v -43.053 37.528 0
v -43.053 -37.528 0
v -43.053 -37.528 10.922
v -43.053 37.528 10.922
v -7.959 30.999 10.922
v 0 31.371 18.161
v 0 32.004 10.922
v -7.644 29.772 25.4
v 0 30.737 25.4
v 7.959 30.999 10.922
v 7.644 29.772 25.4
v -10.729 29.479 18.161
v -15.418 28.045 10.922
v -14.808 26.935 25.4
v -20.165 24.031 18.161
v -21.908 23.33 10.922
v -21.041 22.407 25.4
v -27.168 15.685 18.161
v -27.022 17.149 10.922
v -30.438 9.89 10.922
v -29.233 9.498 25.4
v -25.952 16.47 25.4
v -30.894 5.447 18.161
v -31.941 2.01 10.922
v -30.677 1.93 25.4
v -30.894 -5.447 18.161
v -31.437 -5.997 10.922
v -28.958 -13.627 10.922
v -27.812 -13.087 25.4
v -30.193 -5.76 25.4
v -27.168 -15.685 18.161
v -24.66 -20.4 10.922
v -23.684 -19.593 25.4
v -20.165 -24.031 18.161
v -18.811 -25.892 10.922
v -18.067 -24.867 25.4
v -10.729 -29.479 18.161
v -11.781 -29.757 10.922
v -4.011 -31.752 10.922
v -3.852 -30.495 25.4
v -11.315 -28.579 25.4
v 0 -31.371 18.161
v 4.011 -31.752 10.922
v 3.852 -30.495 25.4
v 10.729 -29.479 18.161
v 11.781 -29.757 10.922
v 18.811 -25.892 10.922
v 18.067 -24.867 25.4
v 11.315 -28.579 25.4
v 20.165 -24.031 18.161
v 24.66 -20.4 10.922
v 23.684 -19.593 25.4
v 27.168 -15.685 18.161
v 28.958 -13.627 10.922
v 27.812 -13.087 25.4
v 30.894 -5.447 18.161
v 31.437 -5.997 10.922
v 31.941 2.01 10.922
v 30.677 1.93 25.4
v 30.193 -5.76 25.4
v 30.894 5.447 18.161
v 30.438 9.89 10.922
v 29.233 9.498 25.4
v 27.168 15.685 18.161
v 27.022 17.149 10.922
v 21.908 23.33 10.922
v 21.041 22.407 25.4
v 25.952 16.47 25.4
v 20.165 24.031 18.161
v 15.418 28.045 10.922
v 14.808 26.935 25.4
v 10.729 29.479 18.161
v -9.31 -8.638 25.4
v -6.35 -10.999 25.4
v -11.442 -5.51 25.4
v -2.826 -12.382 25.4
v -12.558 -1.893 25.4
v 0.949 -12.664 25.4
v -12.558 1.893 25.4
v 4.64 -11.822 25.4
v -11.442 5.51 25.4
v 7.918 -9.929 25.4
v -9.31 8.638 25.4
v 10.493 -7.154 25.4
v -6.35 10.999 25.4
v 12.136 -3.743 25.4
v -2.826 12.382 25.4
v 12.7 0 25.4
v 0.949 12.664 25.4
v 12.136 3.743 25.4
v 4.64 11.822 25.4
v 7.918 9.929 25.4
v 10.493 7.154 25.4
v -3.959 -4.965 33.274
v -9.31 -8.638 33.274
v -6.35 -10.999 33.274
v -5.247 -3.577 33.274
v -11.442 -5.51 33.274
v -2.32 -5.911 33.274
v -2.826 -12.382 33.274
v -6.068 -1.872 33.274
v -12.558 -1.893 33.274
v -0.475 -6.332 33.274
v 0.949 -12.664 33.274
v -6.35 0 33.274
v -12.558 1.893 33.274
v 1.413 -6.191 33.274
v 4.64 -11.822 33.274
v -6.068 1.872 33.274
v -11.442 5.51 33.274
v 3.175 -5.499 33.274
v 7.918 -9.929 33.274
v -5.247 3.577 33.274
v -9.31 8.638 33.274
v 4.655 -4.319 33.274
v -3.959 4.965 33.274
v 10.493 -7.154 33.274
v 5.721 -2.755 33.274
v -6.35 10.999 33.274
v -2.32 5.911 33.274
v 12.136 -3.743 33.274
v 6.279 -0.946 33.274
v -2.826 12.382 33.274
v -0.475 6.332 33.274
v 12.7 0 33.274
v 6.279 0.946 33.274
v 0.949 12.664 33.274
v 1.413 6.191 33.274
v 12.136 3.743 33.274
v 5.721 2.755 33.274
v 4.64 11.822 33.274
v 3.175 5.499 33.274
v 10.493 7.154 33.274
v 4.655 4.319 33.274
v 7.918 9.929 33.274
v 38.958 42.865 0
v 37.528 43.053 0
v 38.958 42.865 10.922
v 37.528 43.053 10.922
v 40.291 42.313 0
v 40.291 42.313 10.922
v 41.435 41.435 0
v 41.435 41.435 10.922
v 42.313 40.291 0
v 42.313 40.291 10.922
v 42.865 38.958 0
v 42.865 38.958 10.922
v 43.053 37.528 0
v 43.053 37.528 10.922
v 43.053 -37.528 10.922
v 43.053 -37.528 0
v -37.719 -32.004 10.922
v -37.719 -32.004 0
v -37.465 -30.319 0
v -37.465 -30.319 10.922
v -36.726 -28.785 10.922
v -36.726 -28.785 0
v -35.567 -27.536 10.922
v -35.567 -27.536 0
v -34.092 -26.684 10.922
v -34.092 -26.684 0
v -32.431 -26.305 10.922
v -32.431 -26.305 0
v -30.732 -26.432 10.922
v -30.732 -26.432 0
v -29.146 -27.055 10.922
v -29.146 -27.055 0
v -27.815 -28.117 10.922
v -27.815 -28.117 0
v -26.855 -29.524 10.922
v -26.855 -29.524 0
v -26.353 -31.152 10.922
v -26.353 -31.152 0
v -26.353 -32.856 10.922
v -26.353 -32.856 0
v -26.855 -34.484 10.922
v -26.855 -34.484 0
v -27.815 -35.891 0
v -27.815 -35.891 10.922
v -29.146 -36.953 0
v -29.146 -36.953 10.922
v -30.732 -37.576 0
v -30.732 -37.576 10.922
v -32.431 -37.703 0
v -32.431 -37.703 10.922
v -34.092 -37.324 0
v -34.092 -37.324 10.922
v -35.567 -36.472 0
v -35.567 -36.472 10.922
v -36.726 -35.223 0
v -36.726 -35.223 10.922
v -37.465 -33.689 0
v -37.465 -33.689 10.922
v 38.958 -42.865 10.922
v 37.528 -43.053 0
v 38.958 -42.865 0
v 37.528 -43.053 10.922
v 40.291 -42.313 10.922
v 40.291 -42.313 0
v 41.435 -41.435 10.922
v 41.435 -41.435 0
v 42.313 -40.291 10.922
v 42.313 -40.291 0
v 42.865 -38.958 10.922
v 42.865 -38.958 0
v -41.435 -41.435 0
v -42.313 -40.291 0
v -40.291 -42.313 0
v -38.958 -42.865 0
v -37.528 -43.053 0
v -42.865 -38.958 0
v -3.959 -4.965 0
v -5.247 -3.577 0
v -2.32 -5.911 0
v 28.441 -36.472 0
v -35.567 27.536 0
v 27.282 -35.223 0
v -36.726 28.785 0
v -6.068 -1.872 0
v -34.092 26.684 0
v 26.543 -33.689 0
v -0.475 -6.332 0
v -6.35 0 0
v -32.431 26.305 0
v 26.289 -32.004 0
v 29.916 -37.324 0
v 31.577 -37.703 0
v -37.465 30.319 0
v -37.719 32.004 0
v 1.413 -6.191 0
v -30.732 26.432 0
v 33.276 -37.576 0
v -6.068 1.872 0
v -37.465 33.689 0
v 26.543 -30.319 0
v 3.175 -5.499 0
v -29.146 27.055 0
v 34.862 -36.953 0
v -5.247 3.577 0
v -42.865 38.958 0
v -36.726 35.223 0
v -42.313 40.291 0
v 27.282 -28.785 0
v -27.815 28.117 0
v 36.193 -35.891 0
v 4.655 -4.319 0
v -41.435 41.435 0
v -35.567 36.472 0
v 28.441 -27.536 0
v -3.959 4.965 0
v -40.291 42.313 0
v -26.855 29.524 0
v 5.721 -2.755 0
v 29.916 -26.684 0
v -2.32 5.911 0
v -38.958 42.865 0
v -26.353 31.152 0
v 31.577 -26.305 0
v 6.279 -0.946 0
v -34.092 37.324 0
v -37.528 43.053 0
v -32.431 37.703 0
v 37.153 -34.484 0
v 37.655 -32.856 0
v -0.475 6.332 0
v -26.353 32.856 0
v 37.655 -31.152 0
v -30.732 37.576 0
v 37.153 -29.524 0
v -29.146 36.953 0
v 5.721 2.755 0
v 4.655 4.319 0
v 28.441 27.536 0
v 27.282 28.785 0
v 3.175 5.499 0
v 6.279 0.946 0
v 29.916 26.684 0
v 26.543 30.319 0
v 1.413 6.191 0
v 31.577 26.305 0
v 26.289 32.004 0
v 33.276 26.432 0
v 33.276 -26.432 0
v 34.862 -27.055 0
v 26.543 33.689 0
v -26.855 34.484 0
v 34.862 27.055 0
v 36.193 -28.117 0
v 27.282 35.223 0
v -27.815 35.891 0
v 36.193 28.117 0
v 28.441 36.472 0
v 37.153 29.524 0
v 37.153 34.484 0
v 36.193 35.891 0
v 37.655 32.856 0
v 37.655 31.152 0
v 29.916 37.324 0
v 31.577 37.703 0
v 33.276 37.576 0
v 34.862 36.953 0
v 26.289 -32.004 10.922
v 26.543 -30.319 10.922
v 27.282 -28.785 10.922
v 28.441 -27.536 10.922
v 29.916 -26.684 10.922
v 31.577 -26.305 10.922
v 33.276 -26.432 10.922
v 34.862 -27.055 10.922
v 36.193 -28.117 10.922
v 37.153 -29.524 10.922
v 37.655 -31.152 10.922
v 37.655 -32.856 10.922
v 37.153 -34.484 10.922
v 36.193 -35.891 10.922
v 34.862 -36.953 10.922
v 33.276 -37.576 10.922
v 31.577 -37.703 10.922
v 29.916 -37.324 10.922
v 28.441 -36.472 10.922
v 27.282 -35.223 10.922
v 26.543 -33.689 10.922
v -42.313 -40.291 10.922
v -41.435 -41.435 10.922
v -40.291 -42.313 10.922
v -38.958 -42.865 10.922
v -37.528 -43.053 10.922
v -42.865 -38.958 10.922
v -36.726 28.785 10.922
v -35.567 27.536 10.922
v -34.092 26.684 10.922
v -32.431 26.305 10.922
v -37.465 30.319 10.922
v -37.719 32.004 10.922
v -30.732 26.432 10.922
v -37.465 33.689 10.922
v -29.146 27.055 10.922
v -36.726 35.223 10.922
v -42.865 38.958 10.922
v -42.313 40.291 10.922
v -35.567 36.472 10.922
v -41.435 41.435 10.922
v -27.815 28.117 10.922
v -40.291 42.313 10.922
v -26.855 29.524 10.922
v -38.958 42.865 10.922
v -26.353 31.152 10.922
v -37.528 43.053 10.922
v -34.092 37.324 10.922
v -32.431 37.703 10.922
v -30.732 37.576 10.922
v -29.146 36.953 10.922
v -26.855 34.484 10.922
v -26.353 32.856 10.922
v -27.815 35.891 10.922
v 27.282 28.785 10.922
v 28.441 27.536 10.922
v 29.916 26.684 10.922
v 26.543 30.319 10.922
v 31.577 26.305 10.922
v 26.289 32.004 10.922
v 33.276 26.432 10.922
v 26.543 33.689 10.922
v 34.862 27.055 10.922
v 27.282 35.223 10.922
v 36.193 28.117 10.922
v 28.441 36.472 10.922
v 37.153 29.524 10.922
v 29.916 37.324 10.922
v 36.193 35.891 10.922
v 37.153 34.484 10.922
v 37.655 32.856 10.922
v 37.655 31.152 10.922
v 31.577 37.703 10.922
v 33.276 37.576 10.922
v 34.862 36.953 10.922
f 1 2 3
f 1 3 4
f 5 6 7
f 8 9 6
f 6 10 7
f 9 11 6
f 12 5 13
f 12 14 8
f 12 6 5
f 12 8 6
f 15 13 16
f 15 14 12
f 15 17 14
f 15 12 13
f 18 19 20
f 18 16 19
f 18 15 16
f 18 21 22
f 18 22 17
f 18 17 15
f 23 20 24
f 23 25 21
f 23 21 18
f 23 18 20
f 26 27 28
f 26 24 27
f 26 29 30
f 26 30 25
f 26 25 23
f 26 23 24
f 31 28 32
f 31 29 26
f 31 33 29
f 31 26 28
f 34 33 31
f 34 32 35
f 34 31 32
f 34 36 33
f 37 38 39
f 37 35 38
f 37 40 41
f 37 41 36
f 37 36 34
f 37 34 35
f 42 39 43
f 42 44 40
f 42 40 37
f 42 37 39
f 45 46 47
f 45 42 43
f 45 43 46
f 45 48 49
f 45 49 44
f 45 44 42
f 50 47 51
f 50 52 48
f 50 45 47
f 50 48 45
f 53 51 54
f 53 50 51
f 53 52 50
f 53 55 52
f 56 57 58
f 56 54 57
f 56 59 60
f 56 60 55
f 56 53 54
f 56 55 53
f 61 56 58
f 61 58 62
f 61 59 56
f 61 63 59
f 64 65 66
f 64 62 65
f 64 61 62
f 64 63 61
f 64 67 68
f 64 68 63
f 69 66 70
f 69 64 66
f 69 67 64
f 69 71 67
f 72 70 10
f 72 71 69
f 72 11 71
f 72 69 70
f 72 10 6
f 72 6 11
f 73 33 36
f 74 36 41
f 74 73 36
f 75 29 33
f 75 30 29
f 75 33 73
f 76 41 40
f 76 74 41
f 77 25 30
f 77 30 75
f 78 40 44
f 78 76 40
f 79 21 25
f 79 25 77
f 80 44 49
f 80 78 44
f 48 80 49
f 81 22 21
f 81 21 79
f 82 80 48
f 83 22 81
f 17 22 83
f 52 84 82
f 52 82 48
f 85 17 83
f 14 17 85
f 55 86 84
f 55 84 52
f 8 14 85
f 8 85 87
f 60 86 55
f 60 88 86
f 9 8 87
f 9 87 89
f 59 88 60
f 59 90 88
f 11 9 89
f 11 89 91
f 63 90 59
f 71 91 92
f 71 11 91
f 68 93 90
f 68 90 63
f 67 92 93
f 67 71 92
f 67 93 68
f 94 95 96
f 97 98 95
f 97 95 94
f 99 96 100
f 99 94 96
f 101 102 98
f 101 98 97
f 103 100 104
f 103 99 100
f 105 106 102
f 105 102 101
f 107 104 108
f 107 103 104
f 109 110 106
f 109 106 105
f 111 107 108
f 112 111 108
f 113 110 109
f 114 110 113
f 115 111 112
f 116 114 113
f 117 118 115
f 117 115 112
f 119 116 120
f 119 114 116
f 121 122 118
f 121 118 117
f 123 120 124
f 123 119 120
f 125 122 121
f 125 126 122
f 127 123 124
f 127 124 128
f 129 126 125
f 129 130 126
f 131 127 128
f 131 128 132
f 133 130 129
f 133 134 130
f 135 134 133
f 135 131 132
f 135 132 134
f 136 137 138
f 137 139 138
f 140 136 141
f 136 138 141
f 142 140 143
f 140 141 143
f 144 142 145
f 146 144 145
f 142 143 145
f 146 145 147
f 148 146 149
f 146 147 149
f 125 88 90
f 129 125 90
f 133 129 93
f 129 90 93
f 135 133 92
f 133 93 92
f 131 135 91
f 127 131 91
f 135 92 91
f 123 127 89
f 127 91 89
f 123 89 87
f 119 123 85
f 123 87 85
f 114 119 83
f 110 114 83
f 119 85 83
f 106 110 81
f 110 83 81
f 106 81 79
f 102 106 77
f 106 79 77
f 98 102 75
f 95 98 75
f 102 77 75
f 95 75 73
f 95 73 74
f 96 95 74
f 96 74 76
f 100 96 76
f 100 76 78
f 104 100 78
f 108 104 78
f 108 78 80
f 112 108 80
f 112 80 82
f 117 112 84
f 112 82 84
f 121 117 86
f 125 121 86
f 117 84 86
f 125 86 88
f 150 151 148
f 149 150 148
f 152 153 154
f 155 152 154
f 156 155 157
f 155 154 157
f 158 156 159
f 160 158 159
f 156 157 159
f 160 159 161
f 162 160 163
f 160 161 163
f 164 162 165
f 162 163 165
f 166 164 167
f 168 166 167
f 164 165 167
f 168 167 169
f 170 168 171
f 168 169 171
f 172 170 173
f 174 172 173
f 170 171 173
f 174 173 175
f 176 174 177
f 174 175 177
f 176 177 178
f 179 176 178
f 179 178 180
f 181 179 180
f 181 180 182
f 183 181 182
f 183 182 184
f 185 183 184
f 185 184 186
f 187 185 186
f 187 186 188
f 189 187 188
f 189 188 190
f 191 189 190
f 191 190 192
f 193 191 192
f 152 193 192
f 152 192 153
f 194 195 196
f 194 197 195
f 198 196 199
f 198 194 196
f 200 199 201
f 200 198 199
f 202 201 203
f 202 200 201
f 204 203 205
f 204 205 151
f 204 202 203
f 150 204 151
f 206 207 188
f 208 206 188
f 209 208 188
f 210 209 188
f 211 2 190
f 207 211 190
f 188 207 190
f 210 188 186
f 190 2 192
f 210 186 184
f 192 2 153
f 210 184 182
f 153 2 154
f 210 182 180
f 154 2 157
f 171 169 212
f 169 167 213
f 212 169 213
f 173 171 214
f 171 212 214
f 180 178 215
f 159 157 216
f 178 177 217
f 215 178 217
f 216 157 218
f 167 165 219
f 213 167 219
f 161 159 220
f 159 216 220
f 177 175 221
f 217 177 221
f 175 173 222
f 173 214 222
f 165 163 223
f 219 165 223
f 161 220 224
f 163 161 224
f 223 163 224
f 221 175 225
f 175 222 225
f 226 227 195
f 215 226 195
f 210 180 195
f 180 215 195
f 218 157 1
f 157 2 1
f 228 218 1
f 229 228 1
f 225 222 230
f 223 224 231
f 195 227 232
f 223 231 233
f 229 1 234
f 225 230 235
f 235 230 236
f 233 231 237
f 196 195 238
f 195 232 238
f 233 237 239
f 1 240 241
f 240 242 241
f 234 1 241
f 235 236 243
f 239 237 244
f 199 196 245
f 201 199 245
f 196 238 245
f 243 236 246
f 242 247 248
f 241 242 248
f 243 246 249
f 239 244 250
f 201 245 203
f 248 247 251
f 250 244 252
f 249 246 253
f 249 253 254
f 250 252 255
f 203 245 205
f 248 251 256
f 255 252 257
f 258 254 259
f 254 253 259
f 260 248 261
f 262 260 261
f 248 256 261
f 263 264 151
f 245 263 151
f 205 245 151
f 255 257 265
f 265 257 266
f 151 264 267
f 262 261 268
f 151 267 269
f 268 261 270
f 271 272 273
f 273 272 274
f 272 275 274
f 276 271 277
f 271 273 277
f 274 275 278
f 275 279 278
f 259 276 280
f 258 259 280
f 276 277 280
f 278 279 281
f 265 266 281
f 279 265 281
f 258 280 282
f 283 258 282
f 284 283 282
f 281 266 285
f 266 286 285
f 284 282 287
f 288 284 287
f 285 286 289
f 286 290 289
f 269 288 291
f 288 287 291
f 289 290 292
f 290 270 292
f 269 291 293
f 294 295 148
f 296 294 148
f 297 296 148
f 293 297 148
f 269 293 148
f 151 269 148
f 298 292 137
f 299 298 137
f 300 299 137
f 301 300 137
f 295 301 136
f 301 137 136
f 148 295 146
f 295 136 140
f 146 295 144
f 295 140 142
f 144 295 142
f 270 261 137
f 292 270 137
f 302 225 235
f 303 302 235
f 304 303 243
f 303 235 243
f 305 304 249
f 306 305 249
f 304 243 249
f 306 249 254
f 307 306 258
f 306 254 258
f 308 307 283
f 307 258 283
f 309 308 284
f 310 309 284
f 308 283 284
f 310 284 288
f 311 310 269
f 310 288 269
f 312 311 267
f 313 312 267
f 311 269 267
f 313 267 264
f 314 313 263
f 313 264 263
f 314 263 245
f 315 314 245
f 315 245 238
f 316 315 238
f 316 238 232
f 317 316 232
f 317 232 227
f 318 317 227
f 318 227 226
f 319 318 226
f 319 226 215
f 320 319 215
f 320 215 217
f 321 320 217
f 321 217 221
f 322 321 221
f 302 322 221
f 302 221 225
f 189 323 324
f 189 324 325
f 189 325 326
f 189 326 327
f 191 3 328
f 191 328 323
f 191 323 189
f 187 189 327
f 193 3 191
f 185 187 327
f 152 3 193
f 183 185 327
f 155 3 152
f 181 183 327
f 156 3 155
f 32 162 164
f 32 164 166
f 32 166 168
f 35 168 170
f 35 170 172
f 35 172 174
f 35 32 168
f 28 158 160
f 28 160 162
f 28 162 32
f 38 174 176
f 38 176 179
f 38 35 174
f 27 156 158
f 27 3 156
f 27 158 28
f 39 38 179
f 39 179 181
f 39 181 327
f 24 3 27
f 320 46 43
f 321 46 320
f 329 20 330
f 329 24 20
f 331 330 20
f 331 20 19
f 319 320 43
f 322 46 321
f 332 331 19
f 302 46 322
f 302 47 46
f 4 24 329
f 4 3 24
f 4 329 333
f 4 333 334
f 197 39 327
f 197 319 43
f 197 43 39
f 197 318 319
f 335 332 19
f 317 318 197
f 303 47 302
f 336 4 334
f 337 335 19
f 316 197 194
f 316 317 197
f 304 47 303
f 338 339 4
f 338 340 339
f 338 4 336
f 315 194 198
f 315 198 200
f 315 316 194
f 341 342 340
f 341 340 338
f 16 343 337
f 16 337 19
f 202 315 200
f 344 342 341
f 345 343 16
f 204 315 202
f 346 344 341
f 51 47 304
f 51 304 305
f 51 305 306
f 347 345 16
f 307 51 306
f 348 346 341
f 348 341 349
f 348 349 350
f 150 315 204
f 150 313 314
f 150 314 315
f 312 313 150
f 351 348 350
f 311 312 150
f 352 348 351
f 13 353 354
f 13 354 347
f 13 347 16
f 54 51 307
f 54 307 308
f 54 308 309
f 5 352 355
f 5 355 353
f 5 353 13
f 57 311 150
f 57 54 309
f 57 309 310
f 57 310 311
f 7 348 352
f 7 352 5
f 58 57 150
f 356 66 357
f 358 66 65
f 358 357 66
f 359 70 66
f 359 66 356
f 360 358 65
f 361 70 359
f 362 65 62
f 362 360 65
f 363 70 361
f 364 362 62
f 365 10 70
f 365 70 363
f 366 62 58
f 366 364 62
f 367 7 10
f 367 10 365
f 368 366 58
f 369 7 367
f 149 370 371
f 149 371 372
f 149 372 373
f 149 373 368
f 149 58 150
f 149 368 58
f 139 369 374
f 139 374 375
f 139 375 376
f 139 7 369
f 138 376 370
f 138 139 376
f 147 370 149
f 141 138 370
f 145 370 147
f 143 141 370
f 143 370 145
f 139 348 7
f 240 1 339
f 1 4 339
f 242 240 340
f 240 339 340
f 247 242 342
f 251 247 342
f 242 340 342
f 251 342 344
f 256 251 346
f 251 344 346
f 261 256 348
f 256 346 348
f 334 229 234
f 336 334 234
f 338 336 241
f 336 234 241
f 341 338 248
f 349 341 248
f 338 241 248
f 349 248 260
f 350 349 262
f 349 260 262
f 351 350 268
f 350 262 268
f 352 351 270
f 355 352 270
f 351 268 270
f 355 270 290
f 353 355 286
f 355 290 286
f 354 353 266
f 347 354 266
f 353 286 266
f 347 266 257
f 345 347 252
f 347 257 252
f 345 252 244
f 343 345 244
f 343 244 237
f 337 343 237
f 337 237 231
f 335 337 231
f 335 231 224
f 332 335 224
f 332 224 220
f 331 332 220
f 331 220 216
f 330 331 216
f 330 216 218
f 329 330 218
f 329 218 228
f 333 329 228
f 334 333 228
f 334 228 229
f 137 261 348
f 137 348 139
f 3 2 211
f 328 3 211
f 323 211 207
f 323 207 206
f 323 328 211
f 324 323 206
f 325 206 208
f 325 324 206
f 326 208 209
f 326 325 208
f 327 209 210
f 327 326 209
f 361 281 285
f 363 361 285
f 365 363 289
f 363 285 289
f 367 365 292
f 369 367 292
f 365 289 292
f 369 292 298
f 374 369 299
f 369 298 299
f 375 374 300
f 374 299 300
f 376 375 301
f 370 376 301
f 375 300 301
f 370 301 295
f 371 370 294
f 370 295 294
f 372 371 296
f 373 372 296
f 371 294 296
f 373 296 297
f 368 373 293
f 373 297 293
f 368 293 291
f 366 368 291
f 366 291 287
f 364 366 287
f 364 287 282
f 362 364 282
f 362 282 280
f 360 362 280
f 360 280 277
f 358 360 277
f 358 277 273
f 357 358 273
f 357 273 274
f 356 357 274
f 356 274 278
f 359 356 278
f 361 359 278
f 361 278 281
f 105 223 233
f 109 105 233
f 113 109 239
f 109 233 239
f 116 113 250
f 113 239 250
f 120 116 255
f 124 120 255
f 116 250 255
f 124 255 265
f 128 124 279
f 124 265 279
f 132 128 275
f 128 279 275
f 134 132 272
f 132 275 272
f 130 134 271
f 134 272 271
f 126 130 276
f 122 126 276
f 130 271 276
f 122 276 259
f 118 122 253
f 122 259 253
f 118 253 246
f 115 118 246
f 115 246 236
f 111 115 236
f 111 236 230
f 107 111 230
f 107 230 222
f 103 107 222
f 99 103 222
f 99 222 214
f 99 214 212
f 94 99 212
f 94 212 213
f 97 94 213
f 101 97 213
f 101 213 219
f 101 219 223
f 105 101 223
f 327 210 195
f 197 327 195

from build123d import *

# Parameters (mm, degrees)
F0_W     = 86.106
F0_H     = 86.106
F1_DEPTH = 10.922
F3_D     = 11.43
F5_DEPTH = 14.478
F5_TAPER = 5
F6_R     = 12.7
F7_DEPTH = 7.874
F9_D     = 12.7
F10_R    = 5.5245


with BuildPart() as f1:
    # F0 (on Top) → F1 (new body)
    with BuildSketch(Plane.XY):
        Rectangle(F0_W, F0_H)
    extrude(amount=F1_DEPTH)

    # F3 (through all)
    with Locations(Plane.XY.offset(10.922)):
        with Locations((-32.004, 32.004), (32.004, 32.004), (32.004, -32.004), (-32.004, -32.004)):
            Hole(F3_D / 2)

    # F4 (on face) → F5 (join)
    with BuildSketch(Plane.XY.offset(10.922)):
        with BuildLine():
            ThreePointArc((32.004, 0), (22.6302453978, 22.6302454524), (-7.72e-08, 32.004))
            ThreePointArc((-7.72e-08, 32.004), (-22.6302453978, -22.6302454524), (32.004, 0))
        make_face()
    extrude(amount=F5_DEPTH, taper=F5_TAPER)

    # F6 (on face) → F7 (join)
    with BuildSketch(Plane.XY.offset(25.4)):
        Circle(F6_R)
    extrude(amount=F7_DEPTH)

    # F9 (through all)
    with Locations(Plane.XY.offset(33.274)):
        with Locations((0, 0)):
            Hole(F9_D / 2)

    # F10
    f10_edges = [f1.edges().sort_by_distance(p)[0] for p in [
        (43.053, 43.053, 5.461),
        (43.053, -43.053, 5.461),
        (-43.053, -43.053, 5.461),
        (-43.053, 43.053, 5.461),
    ]]
    fillet(f10_edges, radius=F10_R)


solid = f1.part
